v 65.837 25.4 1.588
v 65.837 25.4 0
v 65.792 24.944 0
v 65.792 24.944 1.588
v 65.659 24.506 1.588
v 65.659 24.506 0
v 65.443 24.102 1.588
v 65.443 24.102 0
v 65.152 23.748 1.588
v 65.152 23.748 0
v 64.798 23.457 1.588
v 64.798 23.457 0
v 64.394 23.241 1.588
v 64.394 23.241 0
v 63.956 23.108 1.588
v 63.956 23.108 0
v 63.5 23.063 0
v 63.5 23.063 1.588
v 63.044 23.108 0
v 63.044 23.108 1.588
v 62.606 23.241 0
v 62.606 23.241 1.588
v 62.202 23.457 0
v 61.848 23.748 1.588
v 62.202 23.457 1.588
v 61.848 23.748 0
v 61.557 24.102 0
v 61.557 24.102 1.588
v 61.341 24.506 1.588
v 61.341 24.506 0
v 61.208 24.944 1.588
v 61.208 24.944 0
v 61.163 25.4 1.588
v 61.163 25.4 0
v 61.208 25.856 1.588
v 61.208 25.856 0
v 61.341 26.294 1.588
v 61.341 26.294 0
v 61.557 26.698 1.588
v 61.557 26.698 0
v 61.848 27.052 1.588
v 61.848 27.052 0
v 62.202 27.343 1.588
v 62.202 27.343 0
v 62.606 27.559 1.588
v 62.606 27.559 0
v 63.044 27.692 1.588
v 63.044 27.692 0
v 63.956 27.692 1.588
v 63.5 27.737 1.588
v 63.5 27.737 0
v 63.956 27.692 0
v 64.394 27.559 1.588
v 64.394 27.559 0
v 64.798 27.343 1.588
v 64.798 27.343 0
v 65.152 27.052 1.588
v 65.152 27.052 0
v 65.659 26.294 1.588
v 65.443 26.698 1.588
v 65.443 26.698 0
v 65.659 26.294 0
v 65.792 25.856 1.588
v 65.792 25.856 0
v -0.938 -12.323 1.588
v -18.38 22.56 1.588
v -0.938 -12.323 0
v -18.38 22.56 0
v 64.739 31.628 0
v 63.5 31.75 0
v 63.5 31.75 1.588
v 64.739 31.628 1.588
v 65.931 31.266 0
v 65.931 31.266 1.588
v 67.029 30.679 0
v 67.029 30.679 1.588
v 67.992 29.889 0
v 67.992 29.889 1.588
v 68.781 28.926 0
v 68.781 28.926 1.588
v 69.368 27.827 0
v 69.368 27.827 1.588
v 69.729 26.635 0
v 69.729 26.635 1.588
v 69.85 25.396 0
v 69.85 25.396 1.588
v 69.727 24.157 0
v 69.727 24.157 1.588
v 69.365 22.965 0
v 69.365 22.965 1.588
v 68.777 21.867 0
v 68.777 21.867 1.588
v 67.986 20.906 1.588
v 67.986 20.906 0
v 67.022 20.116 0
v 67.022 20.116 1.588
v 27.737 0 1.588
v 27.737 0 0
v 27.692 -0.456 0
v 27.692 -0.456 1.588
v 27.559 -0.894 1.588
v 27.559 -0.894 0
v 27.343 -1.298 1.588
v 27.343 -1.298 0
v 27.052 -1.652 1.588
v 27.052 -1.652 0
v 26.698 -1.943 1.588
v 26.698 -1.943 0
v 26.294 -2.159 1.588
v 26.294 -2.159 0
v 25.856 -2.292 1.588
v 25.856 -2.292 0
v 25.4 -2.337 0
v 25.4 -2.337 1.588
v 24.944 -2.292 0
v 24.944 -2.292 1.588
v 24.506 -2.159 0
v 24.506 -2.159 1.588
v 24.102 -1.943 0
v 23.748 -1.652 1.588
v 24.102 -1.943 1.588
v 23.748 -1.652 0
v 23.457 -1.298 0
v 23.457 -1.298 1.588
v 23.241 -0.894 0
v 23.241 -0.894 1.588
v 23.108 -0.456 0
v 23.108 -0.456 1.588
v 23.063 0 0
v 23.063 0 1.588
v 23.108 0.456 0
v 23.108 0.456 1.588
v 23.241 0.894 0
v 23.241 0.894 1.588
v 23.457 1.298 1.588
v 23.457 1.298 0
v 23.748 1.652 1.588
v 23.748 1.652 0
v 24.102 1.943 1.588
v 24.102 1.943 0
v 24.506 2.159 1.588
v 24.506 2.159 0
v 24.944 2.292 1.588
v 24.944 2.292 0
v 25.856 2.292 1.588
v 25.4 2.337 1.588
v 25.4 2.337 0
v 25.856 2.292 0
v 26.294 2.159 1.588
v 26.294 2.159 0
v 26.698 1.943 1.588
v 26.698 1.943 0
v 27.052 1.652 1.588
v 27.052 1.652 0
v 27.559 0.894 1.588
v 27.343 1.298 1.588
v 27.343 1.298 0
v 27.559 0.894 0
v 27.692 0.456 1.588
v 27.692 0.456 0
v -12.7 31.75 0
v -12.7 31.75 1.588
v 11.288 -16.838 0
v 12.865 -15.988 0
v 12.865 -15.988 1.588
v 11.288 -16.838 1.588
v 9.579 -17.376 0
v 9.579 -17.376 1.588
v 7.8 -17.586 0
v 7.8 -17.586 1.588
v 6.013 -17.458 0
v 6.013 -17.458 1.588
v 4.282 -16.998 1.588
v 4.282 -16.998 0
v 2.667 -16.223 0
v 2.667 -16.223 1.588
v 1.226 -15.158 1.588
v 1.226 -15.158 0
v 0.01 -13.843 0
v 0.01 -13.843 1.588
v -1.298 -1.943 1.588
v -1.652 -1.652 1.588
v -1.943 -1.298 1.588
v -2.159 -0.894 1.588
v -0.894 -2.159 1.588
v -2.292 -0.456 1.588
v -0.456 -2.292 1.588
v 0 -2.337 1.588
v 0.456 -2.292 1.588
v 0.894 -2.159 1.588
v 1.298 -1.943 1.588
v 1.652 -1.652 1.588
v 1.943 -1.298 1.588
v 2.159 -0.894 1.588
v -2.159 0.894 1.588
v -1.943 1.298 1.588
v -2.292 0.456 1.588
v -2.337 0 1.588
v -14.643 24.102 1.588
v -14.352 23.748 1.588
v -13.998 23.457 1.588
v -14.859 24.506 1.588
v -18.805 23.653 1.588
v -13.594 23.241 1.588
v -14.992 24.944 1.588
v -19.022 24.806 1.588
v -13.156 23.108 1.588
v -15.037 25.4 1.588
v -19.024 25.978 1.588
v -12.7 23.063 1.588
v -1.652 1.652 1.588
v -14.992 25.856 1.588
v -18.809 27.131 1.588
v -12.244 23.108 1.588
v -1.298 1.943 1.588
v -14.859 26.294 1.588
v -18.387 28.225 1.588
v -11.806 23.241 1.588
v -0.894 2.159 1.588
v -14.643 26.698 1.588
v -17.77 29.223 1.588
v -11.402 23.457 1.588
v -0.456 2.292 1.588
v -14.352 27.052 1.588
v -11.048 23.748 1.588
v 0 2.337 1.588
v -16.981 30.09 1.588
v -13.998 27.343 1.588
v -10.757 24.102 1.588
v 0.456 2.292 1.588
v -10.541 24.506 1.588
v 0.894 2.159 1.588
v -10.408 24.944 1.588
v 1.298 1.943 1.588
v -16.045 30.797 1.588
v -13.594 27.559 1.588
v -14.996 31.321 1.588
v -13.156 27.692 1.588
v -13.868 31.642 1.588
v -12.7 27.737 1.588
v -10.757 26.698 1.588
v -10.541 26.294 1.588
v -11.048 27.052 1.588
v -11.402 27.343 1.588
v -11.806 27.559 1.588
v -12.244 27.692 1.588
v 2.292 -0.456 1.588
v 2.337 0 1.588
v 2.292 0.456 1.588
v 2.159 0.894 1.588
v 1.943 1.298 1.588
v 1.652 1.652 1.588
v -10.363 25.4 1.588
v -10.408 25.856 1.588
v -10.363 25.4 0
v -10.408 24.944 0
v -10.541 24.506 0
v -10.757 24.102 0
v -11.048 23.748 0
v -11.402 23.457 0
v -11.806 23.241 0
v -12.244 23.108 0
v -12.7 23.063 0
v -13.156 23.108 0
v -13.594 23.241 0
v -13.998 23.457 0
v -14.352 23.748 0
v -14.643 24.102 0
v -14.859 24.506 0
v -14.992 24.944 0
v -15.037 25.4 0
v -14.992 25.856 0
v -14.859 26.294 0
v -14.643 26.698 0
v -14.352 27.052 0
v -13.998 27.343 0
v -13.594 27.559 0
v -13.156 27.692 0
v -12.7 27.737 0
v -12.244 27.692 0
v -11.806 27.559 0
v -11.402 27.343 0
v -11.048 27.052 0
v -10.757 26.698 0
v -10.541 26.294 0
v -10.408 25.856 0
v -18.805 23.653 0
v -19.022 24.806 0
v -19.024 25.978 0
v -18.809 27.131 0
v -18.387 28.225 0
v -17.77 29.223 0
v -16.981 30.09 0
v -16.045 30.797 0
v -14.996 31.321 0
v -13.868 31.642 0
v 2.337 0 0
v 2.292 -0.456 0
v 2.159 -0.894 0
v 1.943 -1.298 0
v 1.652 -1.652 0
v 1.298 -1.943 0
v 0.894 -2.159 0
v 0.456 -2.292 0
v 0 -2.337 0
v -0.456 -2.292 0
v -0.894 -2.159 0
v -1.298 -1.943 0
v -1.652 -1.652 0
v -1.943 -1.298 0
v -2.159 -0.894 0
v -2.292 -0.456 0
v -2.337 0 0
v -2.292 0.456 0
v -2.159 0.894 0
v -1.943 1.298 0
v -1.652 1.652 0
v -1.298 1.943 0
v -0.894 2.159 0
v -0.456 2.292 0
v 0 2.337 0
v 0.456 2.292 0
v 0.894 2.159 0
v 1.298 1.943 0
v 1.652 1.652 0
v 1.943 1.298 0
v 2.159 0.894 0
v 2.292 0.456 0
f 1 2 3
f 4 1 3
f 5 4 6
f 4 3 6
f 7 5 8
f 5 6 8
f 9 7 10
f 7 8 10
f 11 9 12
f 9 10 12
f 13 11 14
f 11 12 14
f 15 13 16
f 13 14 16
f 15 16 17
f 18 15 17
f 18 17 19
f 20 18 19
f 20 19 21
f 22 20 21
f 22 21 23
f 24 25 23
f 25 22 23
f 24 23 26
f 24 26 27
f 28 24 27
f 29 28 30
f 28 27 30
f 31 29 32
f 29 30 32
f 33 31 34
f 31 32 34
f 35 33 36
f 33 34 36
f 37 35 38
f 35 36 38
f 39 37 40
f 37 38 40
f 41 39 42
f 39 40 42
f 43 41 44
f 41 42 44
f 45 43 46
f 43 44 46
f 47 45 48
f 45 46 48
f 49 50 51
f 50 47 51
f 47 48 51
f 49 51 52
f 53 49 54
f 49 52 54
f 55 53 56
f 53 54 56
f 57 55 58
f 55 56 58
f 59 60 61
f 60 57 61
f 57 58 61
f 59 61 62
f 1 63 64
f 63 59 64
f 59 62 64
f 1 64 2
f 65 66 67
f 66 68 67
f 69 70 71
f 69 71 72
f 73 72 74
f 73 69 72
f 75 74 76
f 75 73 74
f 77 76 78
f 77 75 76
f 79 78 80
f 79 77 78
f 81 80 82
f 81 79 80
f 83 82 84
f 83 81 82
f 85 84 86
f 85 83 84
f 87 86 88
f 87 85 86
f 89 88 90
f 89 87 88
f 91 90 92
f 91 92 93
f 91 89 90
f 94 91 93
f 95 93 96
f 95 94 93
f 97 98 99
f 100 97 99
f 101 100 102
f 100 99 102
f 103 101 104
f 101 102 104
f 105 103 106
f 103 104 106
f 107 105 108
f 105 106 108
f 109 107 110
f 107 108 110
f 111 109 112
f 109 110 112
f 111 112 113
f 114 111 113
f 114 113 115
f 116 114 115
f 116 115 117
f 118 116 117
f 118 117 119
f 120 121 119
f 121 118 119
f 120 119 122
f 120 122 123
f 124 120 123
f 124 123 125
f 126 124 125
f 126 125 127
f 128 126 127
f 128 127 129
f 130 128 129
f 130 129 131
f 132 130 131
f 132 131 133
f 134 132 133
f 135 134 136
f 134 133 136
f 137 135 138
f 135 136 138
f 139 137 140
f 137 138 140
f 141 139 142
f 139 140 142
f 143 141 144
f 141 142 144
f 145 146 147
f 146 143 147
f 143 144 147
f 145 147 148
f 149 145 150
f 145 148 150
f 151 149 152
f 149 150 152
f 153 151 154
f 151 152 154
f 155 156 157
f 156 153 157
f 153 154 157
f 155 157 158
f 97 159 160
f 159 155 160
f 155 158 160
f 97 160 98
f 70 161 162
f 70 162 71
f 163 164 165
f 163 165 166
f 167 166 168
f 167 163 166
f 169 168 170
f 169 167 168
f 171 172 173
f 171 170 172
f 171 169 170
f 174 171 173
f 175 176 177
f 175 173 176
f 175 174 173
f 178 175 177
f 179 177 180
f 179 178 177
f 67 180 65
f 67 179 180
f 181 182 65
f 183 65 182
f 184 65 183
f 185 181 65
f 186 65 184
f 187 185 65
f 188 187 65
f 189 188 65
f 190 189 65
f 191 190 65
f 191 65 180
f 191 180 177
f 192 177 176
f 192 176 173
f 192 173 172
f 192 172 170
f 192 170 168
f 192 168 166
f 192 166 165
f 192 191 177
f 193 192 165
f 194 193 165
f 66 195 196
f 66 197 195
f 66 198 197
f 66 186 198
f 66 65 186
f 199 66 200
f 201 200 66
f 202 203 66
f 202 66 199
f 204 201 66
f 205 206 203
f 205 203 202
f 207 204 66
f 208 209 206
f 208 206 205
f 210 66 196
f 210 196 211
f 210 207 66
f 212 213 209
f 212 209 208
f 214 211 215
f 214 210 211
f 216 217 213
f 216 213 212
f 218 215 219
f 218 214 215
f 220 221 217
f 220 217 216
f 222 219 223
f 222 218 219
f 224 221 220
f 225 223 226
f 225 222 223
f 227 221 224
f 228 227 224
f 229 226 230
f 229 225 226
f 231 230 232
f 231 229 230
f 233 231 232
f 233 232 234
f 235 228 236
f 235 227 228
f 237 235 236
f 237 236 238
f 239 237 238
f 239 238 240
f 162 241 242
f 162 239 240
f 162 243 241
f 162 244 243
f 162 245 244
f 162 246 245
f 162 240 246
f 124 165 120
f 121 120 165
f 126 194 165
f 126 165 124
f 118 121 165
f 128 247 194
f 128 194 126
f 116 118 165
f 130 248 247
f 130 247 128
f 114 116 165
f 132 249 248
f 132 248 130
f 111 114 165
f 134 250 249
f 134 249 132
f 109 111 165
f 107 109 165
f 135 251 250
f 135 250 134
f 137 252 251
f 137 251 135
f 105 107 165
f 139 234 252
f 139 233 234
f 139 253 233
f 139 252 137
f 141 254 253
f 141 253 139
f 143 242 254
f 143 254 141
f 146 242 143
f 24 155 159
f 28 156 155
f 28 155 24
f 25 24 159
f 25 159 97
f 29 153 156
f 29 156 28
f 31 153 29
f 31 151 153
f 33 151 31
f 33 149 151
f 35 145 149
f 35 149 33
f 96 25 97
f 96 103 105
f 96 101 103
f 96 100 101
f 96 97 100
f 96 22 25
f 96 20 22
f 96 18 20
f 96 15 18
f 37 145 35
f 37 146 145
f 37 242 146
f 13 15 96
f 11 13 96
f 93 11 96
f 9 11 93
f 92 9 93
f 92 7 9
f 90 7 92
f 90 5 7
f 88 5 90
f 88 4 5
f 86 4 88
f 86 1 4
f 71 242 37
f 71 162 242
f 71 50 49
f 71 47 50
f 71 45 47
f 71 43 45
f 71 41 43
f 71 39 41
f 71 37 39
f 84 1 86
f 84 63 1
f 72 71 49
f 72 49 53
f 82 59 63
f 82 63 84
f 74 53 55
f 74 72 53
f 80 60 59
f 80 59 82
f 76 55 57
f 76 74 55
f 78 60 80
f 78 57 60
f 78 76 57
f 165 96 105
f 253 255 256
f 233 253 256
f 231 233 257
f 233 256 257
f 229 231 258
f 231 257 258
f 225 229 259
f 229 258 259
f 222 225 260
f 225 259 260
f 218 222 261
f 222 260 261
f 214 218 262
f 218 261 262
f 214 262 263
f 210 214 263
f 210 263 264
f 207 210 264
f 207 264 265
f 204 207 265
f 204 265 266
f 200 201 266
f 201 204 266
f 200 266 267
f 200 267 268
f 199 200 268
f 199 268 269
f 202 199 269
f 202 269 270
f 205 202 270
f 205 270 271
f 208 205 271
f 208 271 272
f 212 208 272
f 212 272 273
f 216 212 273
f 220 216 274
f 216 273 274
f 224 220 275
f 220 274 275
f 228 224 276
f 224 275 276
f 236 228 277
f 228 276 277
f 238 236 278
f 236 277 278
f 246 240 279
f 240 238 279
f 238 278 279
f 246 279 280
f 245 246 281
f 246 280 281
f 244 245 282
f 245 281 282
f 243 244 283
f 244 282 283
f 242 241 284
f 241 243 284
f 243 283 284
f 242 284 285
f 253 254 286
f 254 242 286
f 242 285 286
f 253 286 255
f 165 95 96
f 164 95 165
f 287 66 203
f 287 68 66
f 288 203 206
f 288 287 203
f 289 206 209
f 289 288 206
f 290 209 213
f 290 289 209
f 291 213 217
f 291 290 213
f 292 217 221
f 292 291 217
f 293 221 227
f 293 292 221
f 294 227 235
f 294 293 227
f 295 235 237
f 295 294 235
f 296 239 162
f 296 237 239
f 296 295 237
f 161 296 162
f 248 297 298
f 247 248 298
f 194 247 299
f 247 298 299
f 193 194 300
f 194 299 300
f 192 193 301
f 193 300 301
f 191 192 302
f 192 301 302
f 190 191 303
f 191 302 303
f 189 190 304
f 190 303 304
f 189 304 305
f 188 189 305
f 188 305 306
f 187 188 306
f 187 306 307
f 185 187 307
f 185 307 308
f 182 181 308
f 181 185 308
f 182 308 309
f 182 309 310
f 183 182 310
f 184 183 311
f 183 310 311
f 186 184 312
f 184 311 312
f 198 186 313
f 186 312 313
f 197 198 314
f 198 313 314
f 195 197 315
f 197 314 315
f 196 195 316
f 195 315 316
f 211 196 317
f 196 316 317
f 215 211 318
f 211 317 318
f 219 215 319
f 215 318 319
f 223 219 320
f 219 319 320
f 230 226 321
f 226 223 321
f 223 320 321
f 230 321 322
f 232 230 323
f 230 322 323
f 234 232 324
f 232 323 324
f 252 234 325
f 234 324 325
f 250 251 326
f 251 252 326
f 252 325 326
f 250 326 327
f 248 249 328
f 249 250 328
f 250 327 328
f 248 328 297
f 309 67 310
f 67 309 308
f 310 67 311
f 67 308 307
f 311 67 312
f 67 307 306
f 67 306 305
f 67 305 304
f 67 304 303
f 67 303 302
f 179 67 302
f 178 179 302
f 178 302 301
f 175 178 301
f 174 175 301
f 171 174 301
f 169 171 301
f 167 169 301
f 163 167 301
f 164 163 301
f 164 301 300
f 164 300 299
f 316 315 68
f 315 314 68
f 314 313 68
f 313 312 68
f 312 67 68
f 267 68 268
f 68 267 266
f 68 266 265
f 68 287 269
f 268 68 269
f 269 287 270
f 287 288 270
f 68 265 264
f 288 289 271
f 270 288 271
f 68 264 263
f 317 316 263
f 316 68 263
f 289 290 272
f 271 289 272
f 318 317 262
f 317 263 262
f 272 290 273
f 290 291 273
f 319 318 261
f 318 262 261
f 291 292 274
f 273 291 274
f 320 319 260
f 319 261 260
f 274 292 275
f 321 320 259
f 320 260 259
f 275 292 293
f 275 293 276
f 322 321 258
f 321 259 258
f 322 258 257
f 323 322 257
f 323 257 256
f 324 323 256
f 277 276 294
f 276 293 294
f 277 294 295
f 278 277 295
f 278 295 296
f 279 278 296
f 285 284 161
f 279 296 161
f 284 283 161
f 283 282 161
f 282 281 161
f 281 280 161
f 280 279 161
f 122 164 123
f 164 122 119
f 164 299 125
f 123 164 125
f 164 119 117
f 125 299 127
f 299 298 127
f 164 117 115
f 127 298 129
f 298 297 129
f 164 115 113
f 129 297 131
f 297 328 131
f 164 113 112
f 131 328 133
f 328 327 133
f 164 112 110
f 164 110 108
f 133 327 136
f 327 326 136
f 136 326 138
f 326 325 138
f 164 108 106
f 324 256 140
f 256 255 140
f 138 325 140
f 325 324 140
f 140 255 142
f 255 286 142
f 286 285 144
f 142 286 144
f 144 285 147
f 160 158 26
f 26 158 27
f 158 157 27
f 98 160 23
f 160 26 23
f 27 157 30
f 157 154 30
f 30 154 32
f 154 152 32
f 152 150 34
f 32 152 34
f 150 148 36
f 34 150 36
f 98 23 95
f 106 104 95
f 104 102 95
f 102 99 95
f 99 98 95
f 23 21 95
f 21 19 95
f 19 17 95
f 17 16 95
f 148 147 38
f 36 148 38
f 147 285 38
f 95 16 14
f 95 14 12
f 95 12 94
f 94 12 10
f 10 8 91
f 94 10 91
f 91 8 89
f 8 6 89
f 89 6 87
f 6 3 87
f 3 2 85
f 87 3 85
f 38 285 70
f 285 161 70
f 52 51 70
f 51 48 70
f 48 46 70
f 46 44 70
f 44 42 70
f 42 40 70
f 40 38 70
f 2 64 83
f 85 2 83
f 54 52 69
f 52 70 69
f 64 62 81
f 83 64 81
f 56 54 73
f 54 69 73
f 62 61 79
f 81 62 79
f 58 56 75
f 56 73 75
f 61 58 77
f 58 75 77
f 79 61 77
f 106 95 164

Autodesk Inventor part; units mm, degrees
ref_plane "YZ Plane" through (0, 0, 0) normal (1, 0, 0) x (0, 1, 0)
ref_plane "XZ Plane" through (0, 0, 0) normal (0, 1, 0) x (-1, 0, 0)
ref_plane "XY Plane" through (0, 0, 0) normal (0, 0, 1) x (1, 0, 0)
sketch "Sketch12" plane through (0, 0, 0) normal (0, 0, 1) x (1, 0, 0)
  circle A0 centre (0, 0) radius 2.3368
  circle A1 centre (25.4, 0) radius 2.3368
  line L0 (-10.876623, 25.4) -> (39.923377, 25.4) construction
  circle A2 centre (-12.7, 25.4) radius 2.3368
  circle A3 centre (63.5, 25.4) radius 2.3368
  circle A4 centre (63.5, 25.4) radius 6.35
  circle A5 centre (-12.7, 25.4) radius 6.35
  circle A6 centre (0, 0) radius 6.35
  circle A7 centre (25.4, 0) radius 6.35
  line L1 (-12.7, 31.75) -> (63.5, 31.75)
  line L2 (67.022346, 20.116481) -> (12.864885, -15.988494)
  line L3 (-18.379613, 22.560194) -> (-0.938054, -12.322924)
  arc A8 (-0.938054, -12.322924) -> (12.864885, -15.988494) centre (7.581365, -8.063215) ccw
  dimension "d84" = 4.6736
  dimension "d85" = 4.6736
  dimension "d86" = 25.4
  dimension "d87" = 0
  dimension "d88" = 50.8
  dimension "d89" = 25.4
  dimension "d90" = 4.6736
  dimension "d91" = 12.7
  dimension "d92" = 4.6736
  dimension "d93" = 38.1
  dimension "d94" = 12.7
  dimension "d95" = 12.7
  dimension "d96" = 12.7
  dimension "d97" = 12.7
  dimension "d98" = 9.525
extrude "Plate9" add sketch "Sketch12" along normal blind 1.5875 contours A4 | A6 | A7 | A4 L2 A8 L3 A5 L1 | A5
equation "\"d99\" = Thickness"
equation "\"BendRadius\" = Thickness"
equation "\"BendReliefWidth\" = Thickness"
equation "\"BendReliefDepth\" = 0.5 * Thickness"
equation "\"CornerReliefSize\" = 4 * Thickness"
equation "\"MinimumRemnant\" = 2 * Thickness"
equation "\"TransitionRadius\" = BendRadius"
equation "\"JacobiRadiusSize\" = BendRadius"
equation "\"GapSize\" = Thickness"
equation "\"Thickness\" = 1.5875"
properties part number "sleds"
